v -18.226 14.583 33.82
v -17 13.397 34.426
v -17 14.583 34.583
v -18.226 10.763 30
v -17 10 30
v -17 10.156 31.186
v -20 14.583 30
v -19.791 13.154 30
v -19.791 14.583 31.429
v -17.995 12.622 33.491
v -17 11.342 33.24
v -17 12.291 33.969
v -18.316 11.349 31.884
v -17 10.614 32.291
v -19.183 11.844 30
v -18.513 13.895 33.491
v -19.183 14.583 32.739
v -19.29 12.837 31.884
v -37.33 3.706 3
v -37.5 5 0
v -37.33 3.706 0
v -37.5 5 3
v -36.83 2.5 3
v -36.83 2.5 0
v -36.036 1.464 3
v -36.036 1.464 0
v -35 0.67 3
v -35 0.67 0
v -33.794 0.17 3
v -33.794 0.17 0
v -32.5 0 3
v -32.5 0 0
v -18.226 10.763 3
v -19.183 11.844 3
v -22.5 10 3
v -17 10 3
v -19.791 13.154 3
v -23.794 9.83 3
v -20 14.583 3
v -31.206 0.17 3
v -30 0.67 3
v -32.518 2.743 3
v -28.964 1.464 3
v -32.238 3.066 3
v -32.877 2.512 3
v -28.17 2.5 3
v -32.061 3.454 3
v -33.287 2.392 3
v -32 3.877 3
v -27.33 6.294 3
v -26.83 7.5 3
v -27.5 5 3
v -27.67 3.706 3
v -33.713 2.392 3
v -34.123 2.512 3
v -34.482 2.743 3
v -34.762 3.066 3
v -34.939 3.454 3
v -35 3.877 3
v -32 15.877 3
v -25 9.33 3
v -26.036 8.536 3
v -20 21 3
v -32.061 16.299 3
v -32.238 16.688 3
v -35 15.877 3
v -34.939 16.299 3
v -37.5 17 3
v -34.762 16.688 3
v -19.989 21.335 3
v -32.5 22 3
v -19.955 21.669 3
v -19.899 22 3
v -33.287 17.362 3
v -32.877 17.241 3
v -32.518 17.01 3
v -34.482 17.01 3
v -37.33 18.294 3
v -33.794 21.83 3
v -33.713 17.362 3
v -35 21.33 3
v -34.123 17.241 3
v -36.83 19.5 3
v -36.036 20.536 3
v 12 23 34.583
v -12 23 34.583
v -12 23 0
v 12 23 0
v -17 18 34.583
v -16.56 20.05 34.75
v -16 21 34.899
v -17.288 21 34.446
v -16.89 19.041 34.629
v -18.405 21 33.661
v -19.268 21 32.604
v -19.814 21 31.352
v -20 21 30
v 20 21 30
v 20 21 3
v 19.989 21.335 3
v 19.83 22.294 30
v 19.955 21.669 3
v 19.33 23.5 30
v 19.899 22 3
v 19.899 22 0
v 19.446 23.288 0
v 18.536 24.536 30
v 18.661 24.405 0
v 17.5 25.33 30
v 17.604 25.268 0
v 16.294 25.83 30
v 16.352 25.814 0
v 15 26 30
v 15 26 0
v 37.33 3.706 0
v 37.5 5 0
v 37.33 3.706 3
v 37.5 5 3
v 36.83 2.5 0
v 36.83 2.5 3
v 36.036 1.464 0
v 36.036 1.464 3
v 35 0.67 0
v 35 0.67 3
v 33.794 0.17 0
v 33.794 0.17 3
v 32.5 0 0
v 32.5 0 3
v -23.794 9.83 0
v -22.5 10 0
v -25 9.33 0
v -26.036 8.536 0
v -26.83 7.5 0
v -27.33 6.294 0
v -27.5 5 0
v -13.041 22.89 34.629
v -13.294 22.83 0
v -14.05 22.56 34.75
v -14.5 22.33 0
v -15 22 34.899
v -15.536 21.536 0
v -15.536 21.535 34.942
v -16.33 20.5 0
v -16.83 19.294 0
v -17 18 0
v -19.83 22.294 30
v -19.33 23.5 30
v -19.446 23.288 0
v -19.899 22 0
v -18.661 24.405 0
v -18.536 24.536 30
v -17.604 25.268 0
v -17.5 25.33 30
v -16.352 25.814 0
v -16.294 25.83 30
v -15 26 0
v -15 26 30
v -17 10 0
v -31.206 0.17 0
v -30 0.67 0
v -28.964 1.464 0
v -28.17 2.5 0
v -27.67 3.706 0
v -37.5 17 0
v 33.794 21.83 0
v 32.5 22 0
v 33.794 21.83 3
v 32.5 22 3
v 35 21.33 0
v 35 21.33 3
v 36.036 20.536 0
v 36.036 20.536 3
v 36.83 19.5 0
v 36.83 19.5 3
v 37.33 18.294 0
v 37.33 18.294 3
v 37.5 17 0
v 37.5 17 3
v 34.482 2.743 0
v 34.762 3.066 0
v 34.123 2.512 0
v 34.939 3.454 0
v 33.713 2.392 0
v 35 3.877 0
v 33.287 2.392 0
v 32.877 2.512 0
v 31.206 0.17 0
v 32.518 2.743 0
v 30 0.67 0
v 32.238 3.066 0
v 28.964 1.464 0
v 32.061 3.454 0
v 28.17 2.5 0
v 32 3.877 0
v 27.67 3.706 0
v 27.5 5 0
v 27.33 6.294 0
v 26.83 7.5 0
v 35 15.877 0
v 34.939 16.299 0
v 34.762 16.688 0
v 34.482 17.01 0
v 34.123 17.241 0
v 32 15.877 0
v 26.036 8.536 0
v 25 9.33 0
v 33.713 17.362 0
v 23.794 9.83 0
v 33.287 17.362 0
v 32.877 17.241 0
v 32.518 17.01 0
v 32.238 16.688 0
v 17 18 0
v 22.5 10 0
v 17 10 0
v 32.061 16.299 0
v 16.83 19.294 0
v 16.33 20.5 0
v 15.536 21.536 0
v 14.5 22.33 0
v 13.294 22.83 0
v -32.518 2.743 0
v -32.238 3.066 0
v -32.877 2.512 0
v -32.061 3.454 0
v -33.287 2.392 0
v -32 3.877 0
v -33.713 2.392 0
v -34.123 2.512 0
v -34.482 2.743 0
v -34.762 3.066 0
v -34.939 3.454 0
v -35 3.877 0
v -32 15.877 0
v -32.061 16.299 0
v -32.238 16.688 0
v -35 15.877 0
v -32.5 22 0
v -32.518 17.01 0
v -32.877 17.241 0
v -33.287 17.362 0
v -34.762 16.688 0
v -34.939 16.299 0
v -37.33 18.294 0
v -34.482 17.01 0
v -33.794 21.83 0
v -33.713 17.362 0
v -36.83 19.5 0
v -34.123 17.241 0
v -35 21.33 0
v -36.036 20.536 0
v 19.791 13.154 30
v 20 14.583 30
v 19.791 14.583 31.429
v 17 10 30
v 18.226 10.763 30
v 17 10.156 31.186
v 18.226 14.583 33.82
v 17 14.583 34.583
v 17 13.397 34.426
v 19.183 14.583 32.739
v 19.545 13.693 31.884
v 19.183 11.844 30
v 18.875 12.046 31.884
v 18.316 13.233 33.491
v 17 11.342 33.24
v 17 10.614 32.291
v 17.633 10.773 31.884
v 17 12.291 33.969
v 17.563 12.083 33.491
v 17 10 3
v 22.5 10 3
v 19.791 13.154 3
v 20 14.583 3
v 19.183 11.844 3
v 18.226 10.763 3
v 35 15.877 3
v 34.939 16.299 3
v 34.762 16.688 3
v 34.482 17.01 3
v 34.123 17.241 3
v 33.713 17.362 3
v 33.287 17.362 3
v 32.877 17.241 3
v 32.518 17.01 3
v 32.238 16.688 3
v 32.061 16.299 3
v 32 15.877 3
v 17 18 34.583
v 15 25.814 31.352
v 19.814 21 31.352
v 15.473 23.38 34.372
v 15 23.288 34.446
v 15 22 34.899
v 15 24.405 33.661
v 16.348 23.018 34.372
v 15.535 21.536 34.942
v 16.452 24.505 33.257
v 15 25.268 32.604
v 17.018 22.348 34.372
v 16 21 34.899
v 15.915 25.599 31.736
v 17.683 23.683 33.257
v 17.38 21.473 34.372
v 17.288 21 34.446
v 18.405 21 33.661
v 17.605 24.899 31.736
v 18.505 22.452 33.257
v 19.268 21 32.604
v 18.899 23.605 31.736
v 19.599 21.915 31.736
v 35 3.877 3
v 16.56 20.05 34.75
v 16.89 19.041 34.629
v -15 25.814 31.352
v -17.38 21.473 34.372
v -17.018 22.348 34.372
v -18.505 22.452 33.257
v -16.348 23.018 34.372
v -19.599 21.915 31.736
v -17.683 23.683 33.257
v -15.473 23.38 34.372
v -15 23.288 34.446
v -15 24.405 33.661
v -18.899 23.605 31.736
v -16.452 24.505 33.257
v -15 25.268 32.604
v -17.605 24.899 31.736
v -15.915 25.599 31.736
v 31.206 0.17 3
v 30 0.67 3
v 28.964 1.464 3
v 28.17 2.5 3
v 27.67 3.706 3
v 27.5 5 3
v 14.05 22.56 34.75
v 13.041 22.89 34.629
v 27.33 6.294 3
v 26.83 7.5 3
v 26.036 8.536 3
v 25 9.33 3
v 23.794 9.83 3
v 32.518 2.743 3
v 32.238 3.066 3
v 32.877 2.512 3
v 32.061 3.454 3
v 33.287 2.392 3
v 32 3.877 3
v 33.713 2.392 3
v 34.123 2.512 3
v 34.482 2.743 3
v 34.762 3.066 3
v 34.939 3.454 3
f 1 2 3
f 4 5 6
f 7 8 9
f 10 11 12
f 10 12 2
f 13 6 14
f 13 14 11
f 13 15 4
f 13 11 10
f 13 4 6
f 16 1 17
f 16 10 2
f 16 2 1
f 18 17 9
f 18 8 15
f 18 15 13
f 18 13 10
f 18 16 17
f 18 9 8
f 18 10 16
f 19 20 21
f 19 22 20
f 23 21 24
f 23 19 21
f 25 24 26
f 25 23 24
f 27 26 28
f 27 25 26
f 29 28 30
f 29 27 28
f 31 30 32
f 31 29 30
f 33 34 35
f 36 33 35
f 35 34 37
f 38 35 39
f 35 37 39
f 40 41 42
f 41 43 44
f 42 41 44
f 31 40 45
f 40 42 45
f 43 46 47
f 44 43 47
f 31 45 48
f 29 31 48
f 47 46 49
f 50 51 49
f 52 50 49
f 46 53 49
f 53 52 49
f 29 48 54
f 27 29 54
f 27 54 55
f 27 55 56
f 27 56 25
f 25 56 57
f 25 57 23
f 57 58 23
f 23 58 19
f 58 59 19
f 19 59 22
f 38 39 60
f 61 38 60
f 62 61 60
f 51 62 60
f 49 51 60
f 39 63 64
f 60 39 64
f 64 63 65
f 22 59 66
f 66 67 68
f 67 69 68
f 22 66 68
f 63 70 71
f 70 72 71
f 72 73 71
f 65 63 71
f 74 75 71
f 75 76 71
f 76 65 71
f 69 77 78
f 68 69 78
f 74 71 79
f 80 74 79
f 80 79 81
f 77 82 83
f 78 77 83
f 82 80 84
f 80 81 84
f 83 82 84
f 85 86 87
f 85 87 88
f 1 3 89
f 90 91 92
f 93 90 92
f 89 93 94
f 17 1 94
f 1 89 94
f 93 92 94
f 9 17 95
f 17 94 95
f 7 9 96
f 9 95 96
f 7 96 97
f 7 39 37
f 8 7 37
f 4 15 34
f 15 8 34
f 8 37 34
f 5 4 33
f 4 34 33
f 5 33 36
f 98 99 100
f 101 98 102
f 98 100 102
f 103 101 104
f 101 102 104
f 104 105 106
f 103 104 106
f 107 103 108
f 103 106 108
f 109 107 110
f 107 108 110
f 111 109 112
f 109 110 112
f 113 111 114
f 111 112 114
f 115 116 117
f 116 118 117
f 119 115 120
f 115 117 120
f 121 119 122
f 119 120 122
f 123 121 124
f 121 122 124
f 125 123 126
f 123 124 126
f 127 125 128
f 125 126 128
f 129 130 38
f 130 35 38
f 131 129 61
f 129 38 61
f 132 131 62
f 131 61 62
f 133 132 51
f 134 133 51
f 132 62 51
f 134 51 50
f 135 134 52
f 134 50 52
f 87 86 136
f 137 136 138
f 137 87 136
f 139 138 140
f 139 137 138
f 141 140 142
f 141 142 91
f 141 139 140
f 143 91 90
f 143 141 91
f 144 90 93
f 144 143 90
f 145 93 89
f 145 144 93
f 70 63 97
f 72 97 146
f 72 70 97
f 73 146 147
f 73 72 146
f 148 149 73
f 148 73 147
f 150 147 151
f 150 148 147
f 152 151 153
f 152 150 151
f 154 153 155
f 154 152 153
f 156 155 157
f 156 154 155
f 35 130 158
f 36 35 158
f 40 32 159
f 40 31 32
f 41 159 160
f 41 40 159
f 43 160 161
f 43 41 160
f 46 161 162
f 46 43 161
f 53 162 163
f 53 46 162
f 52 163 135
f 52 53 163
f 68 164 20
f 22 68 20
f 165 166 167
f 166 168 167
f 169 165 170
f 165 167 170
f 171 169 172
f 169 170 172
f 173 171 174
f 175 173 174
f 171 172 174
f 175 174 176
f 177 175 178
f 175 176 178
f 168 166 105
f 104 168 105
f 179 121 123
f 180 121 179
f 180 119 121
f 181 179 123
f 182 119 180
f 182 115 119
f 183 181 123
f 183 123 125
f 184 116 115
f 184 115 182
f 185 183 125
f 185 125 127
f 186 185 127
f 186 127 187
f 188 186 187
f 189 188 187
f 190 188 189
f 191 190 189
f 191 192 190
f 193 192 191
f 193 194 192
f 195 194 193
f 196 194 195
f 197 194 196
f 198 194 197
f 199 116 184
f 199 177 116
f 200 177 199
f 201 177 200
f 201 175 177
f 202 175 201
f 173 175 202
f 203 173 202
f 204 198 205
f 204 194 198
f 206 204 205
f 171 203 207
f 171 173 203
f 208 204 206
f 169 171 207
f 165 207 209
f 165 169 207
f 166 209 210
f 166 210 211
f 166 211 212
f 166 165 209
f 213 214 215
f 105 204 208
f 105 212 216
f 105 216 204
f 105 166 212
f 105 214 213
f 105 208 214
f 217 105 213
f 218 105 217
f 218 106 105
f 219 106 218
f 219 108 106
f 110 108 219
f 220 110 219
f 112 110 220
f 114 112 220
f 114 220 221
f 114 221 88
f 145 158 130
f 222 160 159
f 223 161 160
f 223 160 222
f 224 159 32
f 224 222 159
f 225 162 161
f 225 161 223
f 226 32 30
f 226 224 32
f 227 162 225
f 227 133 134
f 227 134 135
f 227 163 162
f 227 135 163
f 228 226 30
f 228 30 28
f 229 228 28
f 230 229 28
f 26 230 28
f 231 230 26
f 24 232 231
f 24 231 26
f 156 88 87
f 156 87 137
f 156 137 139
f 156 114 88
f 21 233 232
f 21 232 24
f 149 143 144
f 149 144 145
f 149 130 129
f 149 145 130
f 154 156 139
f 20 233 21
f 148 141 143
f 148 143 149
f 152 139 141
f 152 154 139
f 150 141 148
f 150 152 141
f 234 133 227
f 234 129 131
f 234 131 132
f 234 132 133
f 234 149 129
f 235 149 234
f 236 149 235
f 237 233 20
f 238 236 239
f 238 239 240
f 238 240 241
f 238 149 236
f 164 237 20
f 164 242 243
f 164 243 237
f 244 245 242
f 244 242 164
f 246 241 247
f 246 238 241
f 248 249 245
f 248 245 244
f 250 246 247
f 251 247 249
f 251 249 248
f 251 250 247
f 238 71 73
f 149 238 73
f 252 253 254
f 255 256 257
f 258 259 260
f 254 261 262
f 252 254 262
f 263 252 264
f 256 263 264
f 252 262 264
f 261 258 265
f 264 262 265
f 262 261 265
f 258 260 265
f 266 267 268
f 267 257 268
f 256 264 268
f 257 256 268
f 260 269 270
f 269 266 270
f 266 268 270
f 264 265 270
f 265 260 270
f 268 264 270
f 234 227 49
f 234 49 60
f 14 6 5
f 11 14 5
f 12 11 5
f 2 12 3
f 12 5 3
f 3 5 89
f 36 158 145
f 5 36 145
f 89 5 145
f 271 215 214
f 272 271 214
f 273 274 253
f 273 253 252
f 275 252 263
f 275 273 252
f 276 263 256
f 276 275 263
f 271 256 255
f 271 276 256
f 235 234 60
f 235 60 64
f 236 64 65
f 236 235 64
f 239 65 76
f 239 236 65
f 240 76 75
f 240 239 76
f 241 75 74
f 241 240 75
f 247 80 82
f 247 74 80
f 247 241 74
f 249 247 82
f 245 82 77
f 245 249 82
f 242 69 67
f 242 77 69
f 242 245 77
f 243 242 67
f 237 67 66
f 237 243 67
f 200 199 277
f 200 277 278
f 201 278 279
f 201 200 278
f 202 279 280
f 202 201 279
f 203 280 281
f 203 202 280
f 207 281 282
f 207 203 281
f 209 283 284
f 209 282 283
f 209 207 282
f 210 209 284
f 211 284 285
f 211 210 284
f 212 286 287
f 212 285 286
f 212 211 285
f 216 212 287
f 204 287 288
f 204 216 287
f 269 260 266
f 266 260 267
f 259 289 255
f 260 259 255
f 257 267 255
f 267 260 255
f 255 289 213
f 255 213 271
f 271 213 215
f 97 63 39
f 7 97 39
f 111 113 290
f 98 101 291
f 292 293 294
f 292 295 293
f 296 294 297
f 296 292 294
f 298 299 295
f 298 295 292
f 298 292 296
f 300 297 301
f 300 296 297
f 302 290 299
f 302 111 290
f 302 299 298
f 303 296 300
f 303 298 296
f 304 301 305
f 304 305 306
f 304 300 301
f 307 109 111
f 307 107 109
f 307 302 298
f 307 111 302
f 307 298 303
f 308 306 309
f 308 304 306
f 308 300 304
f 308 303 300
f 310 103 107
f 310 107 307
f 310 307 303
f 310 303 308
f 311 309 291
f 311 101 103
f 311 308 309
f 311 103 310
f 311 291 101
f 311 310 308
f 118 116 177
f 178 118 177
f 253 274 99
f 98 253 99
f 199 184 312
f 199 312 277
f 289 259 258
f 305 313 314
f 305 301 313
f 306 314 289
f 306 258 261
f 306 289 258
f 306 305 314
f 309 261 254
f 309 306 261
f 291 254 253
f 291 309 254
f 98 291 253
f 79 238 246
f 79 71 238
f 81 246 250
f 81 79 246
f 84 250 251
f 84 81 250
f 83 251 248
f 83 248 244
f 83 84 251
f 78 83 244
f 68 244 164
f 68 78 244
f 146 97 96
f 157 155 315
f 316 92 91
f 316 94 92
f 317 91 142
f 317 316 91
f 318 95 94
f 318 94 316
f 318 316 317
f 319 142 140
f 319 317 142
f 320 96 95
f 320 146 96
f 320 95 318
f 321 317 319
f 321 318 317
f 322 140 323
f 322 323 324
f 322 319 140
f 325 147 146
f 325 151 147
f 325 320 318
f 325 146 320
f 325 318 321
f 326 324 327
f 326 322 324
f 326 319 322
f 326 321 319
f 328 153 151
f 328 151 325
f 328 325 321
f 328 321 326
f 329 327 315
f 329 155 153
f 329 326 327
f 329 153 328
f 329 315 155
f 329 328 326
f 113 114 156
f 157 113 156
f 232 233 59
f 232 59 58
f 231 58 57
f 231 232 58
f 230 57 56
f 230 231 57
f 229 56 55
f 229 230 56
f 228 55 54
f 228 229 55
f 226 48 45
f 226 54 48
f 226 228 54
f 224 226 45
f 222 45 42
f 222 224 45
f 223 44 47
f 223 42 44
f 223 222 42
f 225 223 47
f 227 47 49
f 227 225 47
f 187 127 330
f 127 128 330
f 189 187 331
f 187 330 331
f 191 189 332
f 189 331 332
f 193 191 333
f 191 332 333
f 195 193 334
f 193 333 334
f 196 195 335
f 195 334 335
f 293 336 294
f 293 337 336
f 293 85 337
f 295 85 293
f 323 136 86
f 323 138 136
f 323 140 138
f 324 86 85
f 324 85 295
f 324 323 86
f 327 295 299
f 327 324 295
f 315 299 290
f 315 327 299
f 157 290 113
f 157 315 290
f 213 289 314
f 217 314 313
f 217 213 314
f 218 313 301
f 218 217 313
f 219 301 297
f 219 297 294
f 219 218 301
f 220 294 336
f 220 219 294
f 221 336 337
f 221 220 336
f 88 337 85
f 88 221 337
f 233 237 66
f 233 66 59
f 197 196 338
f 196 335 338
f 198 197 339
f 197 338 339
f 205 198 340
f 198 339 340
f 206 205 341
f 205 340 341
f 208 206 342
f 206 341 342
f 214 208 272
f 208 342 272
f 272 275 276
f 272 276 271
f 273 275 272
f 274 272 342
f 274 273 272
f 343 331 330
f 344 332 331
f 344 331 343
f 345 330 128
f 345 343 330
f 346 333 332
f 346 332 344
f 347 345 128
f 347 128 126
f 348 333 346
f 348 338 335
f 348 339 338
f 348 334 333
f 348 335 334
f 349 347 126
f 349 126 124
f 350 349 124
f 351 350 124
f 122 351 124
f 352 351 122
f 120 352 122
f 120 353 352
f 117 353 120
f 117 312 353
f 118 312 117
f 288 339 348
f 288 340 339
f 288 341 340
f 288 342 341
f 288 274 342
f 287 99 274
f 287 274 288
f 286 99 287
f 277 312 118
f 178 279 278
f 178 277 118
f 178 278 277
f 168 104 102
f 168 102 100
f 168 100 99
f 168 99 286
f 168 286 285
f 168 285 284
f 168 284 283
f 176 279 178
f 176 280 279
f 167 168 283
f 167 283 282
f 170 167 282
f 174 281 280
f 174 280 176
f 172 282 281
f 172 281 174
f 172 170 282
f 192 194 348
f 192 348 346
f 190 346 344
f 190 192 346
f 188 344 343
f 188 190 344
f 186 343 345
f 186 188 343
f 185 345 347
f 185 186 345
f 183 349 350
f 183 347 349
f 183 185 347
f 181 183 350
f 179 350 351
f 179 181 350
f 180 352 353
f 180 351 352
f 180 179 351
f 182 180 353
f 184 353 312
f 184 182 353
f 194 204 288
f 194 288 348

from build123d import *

# Parameters (mm, degrees)
F2_DEPTH     = 35
F3_DEPTH     = 3
F4_DEPTH     = 25
F5_R         = 4.99999
F6_T1_DEPTH  = 35
F6_T3_DEPTH  = 35
F6_T8_DEPTH  = 60
F6_T13_DEPTH = 60
F6_T15_DEPTH = 43.4564392374
F6_T20_DEPTH = 60
F6_T25_DEPTH = 60
F6_T27_DEPTH = 43.4564392374
F7_T1_DEPTH  = 6.417424305
F7_T3_DEPTH  = 30
F7_T6_ANGLE  = 89.9999999974
F7_T8_ANGLE  = 89.9999999974
F7_T10_ANGLE = 209.6926070845
F7_T12_ANGLE = 209.6926070845


# Not quite as in the source:
# - a fillet or chamfer that OpenCascade refuses, or shapes differently, is made with other operations: its cross-section is extruded or revolved along the edge and cut away or added
# - a fillet or chamfer is up to 0.001 mm smaller than in the source, because OpenCascade refuses the exact size


with BuildPart() as f2:
    # F0 (on Top) → F2 (new body)
    with BuildSketch(Plane.XY):
        Polygon((20, 26), (0, 26), (-20, 26), (-20, 22), (-20, 10), (-17, 10), (-17, 23), (0, 23), (17, 23), (17, 10), (20, 10), (20, 22), align=None)
    extrude(amount=F2_DEPTH)

    # F0 (on Top) → F3 (join)
    with BuildSketch(Plane.XY):
        Polygon((-20, 10), (-20, 22), (-37.5, 22), (-37.5, 0), (-27.5, 0), (-27.5, 10), align=None)
        Polygon((37.5, 22), (20, 22), (20, 10), (27.5, 10), (27.5, 0), (37.5, 0), align=None)
    extrude(amount=F3_DEPTH)

    # F1 (on Top) → F4 (cut)
    with BuildSketch(Plane.XY):
        with BuildLine():
            Line((35, 3.8767794613), (35, 15.8767794613))
            ThreePointArc((35, 15.8767794613), (33.5, 17.3767794613), (32, 15.8767794613))
            Line((32, 15.8767794613), (32, 3.8767794613))
            ThreePointArc((32, 3.8767794613), (33.5, 2.3767794613), (35, 3.8767794613))
        make_face()
        with BuildLine():
            ThreePointArc((-32, 15.8767794613), (-33.5, 17.3767794613), (-35, 15.8767794613))
            Line((-35, 15.8767794613), (-35, 3.8767794613))
            ThreePointArc((-35, 3.8767794613), (-33.5, 2.3767794613), (-32, 3.8767794613))
            Line((-32, 3.8767794613), (-32, 15.8767794613))
        make_face()
    extrude(amount=F4_DEPTH, mode=Mode.SUBTRACT)

    # F5 (radius 5 in the source; OpenCascade refuses exactly that, so slightly less here)
    f5_edges = [f2.edges().sort_by_distance(p)[0] for p in [
        (-37.5, 0, 1.5),
        (-27.5, 0, 1.5),
        (-37.5, 22, 1.5),
        (37.5, 22, 1.5),
        (37.5, 0, 1.5),
        (27.5, 0, 1.5),
        (27.5, 10, 1.5),
        (-27.5, 10, 1.5),
    ]]
    fillet(f5_edges, radius=F5_R)

    # F6: fillet of radius 5 on 6 edges, made by hand

    # F6_s2 → F6_t1 (join)
    with BuildSketch(Plane.XY):
        with BuildLine():
            ThreePointArc((17, 18), (15.5355339059, 21.5355339059), (12, 23))
            Line((12, 23), (17, 23))
            Line((17, 23), (17, 18))
        make_face()
    extrude(amount=F6_T1_DEPTH)

    # F6_s4 → F6_t3 (join)
    with BuildSketch(Plane.XY):
        with BuildLine():
            ThreePointArc((-12, 23), (-15.5355339059, 21.5355339059), (-17, 18))
            Line((-17, 18), (-17, 23))
            Line((-17, 23), (-12, 23))
        make_face()
    extrude(amount=F6_T3_DEPTH)


with BuildPart() as f6_tool6:
    # F6_s7 → F6_t8 (new body)
    with BuildSketch(Plane.XY.offset(-12.5)):
        with BuildLine():
            ThreePointArc((20, 21), (18.5355339059, 24.5355339059), (15, 26))
            Line((15, 26), (20, 26))
            Line((20, 26), (20, 21))
        make_face()
    extrude(amount=F6_T8_DEPTH)

    split(bisect_by=Plane.XZ.offset(-22), keep=Keep.BOTTOM)


with BuildPart() as f2_1:
    add(f2.part)

    # F6_t5: cut F6_tool6
    add(f6_tool6.part, mode=Mode.SUBTRACT)


with BuildPart() as f6_tool11:
    # F6_s12 → F6_t13 (new body)
    with BuildSketch(Plane.XY.offset(-12.5)):
        with BuildLine():
            ThreePointArc((20, 21), (18.5355339059, 24.5355339059), (15, 26))
            Line((15, 26), (20, 26))
            Line((20, 26), (20, 21))
        make_face()
    extrude(amount=F6_T13_DEPTH)

    split(bisect_by=Plane.XY.offset(3), keep=Keep.TOP)


with BuildPart() as f2_2:
    add(f2_1.part)

    # F6_t10: cut F6_tool11
    add(f6_tool11.part, mode=Mode.SUBTRACT)

    # F6_s16 → F6_t15 (cut)
    with BuildSketch(Plane.XY.offset(3)):
        with BuildLine():
            ThreePointArc((20, 14.582575695), (19.1833001327, 11.8439629074), (17, 10))
            Line((17, 10), (20, 10))
            Line((20, 10), (20, 14.582575695))
        make_face()
    extrude(amount=F6_T15_DEPTH, mode=Mode.SUBTRACT)


with BuildPart() as f6_tool18:
    # F6_s19 → F6_t20 (new body)
    with BuildSketch(Plane.XY.offset(-12.5)):
        with BuildLine():
            ThreePointArc((-20, 21), (-18.5355339059, 24.5355339059), (-15, 26))
            Line((-15, 26), (-20, 26))
            Line((-20, 26), (-20, 21))
        make_face()
    extrude(amount=F6_T20_DEPTH)

    split(bisect_by=Plane.XZ.offset(-22), keep=Keep.BOTTOM)


with BuildPart() as f2_3:
    add(f2_2.part)

    # F6_t17: cut F6_tool18
    add(f6_tool18.part, mode=Mode.SUBTRACT)


with BuildPart() as f6_tool23:
    # F6_s24 → F6_t25 (new body)
    with BuildSketch(Plane.XY.offset(-12.5)):
        with BuildLine():
            ThreePointArc((-20, 21), (-18.5355339059, 24.5355339059), (-15, 26))
            Line((-15, 26), (-20, 26))
            Line((-20, 26), (-20, 21))
        make_face()
    extrude(amount=F6_T25_DEPTH)

    split(bisect_by=Plane.XY.offset(3), keep=Keep.TOP)


with BuildPart() as f2_4:
    add(f2_3.part)

    # F6_t22: cut F6_tool23
    add(f6_tool23.part, mode=Mode.SUBTRACT)

    # F6_s28 → F6_t27 (cut)
    with BuildSketch(Plane.XY.offset(3)):
        with BuildLine():
            ThreePointArc((-20, 14.582575695), (-19.1833001327, 11.8439629074), (-17, 10))
            Line((-17, 10), (-20, 10))
            Line((-20, 10), (-20, 14.582575695))
        make_face()
    extrude(amount=F6_T27_DEPTH, mode=Mode.SUBTRACT)

    # F7: fillet of radius 5 on 3 edges, made by hand

    # F7_s2 → F7_t1 (cut)
    with BuildSketch(Plane.XZ.offset(-21)):
        with BuildLine():
            ThreePointArc((-15, 35), (-18.5355339059, 33.5355339059), (-20, 30))
            Line((-20, 30), (-20, 35))
            Line((-20, 35), (-15, 35))
        make_face()
        with BuildLine():
            ThreePointArc((15, 35), (18.5355339059, 33.5355339059), (20, 30))
            Line((20, 30), (20, 35))
            Line((20, 35), (15, 35))
        make_face()
    extrude(amount=F7_T1_DEPTH, mode=Mode.SUBTRACT)

    # F7_s4 → F7_t3 (cut)
    with BuildSketch(Plane.YZ.offset(-15)):
        with BuildLine():
            ThreePointArc((21, 35), (24.5355339059, 33.5355339059), (26, 30))
            Line((26, 30), (26, 35))
            Line((26, 35), (21, 35))
        make_face()
    extrude(amount=F7_T3_DEPTH, mode=Mode.SUBTRACT)

    # F7_s5 → F7_t6 (revolve, cut)
    with BuildSketch(Plane.YZ.offset(14.9999999999)):
        with BuildLine():
            ThreePointArc((21, 35), (24.5355339059, 33.5355339059), (26, 30))
            Line((26, 30), (26, 35))
            Line((26, 35), (21, 35))
        make_face()
    revolve(axis=Axis((14.9999999999, 20.9999999999, 35), (0, 0, -1)), revolution_arc=F7_T6_ANGLE, mode=Mode.SUBTRACT)

    # F7_s7 → F7_t8 (revolve, cut)
    with BuildSketch(Plane.XZ.offset(-20.9999999999)):
        with BuildLine():
            ThreePointArc((-15, 35), (-18.5355339059, 33.5355339059), (-20, 30))
            Line((-20, 30), (-20, 35))
            Line((-20, 35), (-15, 35))
        make_face()
    revolve(axis=Axis((-14.9999999999, 20.9999999999, 35), (0, 0, -1)), revolution_arc=F7_T8_ANGLE, mode=Mode.SUBTRACT)

    # F7_s9 → F7_t10 (revolve, cut)
    with BuildSketch(Plane.XZ.offset(-14.5825756948)):
        with BuildLine():
            ThreePointArc((20, 30), (18.5355339059, 33.5355339059), (15, 35))
            Line((15, 35), (20, 35))
            Line((20, 35), (20, 30))
        make_face()
    revolve(axis=Axis((15.0000000002, 14.5825756948, 35), (0, 0, -1)), revolution_arc=F7_T10_ANGLE, mode=Mode.SUBTRACT)

    # F7_s11 → F7_t12 (revolve, cut)
    with BuildSketch(Plane(origin=(-9.9554834358, 17.4590545428, 0), x_dir=(0, 0, 1), z_dir=(-0.4953465841, 0.8686954366, 0))):
        with BuildLine():
            ThreePointArc((35, -5.8070024913), (33.5355339059, -2.2714685854), (30, -0.8070024913))
            Line((30, -0.8070024913), (35, -0.8070024913))
            Line((35, -0.8070024913), (35, -5.8070024913))
        make_face()
    revolve(axis=Axis((-15.0000000002, 14.5825756948, 35), (0, 0, -1)), revolution_arc=F7_T12_ANGLE, mode=Mode.SUBTRACT)


solid = f2_4.part
